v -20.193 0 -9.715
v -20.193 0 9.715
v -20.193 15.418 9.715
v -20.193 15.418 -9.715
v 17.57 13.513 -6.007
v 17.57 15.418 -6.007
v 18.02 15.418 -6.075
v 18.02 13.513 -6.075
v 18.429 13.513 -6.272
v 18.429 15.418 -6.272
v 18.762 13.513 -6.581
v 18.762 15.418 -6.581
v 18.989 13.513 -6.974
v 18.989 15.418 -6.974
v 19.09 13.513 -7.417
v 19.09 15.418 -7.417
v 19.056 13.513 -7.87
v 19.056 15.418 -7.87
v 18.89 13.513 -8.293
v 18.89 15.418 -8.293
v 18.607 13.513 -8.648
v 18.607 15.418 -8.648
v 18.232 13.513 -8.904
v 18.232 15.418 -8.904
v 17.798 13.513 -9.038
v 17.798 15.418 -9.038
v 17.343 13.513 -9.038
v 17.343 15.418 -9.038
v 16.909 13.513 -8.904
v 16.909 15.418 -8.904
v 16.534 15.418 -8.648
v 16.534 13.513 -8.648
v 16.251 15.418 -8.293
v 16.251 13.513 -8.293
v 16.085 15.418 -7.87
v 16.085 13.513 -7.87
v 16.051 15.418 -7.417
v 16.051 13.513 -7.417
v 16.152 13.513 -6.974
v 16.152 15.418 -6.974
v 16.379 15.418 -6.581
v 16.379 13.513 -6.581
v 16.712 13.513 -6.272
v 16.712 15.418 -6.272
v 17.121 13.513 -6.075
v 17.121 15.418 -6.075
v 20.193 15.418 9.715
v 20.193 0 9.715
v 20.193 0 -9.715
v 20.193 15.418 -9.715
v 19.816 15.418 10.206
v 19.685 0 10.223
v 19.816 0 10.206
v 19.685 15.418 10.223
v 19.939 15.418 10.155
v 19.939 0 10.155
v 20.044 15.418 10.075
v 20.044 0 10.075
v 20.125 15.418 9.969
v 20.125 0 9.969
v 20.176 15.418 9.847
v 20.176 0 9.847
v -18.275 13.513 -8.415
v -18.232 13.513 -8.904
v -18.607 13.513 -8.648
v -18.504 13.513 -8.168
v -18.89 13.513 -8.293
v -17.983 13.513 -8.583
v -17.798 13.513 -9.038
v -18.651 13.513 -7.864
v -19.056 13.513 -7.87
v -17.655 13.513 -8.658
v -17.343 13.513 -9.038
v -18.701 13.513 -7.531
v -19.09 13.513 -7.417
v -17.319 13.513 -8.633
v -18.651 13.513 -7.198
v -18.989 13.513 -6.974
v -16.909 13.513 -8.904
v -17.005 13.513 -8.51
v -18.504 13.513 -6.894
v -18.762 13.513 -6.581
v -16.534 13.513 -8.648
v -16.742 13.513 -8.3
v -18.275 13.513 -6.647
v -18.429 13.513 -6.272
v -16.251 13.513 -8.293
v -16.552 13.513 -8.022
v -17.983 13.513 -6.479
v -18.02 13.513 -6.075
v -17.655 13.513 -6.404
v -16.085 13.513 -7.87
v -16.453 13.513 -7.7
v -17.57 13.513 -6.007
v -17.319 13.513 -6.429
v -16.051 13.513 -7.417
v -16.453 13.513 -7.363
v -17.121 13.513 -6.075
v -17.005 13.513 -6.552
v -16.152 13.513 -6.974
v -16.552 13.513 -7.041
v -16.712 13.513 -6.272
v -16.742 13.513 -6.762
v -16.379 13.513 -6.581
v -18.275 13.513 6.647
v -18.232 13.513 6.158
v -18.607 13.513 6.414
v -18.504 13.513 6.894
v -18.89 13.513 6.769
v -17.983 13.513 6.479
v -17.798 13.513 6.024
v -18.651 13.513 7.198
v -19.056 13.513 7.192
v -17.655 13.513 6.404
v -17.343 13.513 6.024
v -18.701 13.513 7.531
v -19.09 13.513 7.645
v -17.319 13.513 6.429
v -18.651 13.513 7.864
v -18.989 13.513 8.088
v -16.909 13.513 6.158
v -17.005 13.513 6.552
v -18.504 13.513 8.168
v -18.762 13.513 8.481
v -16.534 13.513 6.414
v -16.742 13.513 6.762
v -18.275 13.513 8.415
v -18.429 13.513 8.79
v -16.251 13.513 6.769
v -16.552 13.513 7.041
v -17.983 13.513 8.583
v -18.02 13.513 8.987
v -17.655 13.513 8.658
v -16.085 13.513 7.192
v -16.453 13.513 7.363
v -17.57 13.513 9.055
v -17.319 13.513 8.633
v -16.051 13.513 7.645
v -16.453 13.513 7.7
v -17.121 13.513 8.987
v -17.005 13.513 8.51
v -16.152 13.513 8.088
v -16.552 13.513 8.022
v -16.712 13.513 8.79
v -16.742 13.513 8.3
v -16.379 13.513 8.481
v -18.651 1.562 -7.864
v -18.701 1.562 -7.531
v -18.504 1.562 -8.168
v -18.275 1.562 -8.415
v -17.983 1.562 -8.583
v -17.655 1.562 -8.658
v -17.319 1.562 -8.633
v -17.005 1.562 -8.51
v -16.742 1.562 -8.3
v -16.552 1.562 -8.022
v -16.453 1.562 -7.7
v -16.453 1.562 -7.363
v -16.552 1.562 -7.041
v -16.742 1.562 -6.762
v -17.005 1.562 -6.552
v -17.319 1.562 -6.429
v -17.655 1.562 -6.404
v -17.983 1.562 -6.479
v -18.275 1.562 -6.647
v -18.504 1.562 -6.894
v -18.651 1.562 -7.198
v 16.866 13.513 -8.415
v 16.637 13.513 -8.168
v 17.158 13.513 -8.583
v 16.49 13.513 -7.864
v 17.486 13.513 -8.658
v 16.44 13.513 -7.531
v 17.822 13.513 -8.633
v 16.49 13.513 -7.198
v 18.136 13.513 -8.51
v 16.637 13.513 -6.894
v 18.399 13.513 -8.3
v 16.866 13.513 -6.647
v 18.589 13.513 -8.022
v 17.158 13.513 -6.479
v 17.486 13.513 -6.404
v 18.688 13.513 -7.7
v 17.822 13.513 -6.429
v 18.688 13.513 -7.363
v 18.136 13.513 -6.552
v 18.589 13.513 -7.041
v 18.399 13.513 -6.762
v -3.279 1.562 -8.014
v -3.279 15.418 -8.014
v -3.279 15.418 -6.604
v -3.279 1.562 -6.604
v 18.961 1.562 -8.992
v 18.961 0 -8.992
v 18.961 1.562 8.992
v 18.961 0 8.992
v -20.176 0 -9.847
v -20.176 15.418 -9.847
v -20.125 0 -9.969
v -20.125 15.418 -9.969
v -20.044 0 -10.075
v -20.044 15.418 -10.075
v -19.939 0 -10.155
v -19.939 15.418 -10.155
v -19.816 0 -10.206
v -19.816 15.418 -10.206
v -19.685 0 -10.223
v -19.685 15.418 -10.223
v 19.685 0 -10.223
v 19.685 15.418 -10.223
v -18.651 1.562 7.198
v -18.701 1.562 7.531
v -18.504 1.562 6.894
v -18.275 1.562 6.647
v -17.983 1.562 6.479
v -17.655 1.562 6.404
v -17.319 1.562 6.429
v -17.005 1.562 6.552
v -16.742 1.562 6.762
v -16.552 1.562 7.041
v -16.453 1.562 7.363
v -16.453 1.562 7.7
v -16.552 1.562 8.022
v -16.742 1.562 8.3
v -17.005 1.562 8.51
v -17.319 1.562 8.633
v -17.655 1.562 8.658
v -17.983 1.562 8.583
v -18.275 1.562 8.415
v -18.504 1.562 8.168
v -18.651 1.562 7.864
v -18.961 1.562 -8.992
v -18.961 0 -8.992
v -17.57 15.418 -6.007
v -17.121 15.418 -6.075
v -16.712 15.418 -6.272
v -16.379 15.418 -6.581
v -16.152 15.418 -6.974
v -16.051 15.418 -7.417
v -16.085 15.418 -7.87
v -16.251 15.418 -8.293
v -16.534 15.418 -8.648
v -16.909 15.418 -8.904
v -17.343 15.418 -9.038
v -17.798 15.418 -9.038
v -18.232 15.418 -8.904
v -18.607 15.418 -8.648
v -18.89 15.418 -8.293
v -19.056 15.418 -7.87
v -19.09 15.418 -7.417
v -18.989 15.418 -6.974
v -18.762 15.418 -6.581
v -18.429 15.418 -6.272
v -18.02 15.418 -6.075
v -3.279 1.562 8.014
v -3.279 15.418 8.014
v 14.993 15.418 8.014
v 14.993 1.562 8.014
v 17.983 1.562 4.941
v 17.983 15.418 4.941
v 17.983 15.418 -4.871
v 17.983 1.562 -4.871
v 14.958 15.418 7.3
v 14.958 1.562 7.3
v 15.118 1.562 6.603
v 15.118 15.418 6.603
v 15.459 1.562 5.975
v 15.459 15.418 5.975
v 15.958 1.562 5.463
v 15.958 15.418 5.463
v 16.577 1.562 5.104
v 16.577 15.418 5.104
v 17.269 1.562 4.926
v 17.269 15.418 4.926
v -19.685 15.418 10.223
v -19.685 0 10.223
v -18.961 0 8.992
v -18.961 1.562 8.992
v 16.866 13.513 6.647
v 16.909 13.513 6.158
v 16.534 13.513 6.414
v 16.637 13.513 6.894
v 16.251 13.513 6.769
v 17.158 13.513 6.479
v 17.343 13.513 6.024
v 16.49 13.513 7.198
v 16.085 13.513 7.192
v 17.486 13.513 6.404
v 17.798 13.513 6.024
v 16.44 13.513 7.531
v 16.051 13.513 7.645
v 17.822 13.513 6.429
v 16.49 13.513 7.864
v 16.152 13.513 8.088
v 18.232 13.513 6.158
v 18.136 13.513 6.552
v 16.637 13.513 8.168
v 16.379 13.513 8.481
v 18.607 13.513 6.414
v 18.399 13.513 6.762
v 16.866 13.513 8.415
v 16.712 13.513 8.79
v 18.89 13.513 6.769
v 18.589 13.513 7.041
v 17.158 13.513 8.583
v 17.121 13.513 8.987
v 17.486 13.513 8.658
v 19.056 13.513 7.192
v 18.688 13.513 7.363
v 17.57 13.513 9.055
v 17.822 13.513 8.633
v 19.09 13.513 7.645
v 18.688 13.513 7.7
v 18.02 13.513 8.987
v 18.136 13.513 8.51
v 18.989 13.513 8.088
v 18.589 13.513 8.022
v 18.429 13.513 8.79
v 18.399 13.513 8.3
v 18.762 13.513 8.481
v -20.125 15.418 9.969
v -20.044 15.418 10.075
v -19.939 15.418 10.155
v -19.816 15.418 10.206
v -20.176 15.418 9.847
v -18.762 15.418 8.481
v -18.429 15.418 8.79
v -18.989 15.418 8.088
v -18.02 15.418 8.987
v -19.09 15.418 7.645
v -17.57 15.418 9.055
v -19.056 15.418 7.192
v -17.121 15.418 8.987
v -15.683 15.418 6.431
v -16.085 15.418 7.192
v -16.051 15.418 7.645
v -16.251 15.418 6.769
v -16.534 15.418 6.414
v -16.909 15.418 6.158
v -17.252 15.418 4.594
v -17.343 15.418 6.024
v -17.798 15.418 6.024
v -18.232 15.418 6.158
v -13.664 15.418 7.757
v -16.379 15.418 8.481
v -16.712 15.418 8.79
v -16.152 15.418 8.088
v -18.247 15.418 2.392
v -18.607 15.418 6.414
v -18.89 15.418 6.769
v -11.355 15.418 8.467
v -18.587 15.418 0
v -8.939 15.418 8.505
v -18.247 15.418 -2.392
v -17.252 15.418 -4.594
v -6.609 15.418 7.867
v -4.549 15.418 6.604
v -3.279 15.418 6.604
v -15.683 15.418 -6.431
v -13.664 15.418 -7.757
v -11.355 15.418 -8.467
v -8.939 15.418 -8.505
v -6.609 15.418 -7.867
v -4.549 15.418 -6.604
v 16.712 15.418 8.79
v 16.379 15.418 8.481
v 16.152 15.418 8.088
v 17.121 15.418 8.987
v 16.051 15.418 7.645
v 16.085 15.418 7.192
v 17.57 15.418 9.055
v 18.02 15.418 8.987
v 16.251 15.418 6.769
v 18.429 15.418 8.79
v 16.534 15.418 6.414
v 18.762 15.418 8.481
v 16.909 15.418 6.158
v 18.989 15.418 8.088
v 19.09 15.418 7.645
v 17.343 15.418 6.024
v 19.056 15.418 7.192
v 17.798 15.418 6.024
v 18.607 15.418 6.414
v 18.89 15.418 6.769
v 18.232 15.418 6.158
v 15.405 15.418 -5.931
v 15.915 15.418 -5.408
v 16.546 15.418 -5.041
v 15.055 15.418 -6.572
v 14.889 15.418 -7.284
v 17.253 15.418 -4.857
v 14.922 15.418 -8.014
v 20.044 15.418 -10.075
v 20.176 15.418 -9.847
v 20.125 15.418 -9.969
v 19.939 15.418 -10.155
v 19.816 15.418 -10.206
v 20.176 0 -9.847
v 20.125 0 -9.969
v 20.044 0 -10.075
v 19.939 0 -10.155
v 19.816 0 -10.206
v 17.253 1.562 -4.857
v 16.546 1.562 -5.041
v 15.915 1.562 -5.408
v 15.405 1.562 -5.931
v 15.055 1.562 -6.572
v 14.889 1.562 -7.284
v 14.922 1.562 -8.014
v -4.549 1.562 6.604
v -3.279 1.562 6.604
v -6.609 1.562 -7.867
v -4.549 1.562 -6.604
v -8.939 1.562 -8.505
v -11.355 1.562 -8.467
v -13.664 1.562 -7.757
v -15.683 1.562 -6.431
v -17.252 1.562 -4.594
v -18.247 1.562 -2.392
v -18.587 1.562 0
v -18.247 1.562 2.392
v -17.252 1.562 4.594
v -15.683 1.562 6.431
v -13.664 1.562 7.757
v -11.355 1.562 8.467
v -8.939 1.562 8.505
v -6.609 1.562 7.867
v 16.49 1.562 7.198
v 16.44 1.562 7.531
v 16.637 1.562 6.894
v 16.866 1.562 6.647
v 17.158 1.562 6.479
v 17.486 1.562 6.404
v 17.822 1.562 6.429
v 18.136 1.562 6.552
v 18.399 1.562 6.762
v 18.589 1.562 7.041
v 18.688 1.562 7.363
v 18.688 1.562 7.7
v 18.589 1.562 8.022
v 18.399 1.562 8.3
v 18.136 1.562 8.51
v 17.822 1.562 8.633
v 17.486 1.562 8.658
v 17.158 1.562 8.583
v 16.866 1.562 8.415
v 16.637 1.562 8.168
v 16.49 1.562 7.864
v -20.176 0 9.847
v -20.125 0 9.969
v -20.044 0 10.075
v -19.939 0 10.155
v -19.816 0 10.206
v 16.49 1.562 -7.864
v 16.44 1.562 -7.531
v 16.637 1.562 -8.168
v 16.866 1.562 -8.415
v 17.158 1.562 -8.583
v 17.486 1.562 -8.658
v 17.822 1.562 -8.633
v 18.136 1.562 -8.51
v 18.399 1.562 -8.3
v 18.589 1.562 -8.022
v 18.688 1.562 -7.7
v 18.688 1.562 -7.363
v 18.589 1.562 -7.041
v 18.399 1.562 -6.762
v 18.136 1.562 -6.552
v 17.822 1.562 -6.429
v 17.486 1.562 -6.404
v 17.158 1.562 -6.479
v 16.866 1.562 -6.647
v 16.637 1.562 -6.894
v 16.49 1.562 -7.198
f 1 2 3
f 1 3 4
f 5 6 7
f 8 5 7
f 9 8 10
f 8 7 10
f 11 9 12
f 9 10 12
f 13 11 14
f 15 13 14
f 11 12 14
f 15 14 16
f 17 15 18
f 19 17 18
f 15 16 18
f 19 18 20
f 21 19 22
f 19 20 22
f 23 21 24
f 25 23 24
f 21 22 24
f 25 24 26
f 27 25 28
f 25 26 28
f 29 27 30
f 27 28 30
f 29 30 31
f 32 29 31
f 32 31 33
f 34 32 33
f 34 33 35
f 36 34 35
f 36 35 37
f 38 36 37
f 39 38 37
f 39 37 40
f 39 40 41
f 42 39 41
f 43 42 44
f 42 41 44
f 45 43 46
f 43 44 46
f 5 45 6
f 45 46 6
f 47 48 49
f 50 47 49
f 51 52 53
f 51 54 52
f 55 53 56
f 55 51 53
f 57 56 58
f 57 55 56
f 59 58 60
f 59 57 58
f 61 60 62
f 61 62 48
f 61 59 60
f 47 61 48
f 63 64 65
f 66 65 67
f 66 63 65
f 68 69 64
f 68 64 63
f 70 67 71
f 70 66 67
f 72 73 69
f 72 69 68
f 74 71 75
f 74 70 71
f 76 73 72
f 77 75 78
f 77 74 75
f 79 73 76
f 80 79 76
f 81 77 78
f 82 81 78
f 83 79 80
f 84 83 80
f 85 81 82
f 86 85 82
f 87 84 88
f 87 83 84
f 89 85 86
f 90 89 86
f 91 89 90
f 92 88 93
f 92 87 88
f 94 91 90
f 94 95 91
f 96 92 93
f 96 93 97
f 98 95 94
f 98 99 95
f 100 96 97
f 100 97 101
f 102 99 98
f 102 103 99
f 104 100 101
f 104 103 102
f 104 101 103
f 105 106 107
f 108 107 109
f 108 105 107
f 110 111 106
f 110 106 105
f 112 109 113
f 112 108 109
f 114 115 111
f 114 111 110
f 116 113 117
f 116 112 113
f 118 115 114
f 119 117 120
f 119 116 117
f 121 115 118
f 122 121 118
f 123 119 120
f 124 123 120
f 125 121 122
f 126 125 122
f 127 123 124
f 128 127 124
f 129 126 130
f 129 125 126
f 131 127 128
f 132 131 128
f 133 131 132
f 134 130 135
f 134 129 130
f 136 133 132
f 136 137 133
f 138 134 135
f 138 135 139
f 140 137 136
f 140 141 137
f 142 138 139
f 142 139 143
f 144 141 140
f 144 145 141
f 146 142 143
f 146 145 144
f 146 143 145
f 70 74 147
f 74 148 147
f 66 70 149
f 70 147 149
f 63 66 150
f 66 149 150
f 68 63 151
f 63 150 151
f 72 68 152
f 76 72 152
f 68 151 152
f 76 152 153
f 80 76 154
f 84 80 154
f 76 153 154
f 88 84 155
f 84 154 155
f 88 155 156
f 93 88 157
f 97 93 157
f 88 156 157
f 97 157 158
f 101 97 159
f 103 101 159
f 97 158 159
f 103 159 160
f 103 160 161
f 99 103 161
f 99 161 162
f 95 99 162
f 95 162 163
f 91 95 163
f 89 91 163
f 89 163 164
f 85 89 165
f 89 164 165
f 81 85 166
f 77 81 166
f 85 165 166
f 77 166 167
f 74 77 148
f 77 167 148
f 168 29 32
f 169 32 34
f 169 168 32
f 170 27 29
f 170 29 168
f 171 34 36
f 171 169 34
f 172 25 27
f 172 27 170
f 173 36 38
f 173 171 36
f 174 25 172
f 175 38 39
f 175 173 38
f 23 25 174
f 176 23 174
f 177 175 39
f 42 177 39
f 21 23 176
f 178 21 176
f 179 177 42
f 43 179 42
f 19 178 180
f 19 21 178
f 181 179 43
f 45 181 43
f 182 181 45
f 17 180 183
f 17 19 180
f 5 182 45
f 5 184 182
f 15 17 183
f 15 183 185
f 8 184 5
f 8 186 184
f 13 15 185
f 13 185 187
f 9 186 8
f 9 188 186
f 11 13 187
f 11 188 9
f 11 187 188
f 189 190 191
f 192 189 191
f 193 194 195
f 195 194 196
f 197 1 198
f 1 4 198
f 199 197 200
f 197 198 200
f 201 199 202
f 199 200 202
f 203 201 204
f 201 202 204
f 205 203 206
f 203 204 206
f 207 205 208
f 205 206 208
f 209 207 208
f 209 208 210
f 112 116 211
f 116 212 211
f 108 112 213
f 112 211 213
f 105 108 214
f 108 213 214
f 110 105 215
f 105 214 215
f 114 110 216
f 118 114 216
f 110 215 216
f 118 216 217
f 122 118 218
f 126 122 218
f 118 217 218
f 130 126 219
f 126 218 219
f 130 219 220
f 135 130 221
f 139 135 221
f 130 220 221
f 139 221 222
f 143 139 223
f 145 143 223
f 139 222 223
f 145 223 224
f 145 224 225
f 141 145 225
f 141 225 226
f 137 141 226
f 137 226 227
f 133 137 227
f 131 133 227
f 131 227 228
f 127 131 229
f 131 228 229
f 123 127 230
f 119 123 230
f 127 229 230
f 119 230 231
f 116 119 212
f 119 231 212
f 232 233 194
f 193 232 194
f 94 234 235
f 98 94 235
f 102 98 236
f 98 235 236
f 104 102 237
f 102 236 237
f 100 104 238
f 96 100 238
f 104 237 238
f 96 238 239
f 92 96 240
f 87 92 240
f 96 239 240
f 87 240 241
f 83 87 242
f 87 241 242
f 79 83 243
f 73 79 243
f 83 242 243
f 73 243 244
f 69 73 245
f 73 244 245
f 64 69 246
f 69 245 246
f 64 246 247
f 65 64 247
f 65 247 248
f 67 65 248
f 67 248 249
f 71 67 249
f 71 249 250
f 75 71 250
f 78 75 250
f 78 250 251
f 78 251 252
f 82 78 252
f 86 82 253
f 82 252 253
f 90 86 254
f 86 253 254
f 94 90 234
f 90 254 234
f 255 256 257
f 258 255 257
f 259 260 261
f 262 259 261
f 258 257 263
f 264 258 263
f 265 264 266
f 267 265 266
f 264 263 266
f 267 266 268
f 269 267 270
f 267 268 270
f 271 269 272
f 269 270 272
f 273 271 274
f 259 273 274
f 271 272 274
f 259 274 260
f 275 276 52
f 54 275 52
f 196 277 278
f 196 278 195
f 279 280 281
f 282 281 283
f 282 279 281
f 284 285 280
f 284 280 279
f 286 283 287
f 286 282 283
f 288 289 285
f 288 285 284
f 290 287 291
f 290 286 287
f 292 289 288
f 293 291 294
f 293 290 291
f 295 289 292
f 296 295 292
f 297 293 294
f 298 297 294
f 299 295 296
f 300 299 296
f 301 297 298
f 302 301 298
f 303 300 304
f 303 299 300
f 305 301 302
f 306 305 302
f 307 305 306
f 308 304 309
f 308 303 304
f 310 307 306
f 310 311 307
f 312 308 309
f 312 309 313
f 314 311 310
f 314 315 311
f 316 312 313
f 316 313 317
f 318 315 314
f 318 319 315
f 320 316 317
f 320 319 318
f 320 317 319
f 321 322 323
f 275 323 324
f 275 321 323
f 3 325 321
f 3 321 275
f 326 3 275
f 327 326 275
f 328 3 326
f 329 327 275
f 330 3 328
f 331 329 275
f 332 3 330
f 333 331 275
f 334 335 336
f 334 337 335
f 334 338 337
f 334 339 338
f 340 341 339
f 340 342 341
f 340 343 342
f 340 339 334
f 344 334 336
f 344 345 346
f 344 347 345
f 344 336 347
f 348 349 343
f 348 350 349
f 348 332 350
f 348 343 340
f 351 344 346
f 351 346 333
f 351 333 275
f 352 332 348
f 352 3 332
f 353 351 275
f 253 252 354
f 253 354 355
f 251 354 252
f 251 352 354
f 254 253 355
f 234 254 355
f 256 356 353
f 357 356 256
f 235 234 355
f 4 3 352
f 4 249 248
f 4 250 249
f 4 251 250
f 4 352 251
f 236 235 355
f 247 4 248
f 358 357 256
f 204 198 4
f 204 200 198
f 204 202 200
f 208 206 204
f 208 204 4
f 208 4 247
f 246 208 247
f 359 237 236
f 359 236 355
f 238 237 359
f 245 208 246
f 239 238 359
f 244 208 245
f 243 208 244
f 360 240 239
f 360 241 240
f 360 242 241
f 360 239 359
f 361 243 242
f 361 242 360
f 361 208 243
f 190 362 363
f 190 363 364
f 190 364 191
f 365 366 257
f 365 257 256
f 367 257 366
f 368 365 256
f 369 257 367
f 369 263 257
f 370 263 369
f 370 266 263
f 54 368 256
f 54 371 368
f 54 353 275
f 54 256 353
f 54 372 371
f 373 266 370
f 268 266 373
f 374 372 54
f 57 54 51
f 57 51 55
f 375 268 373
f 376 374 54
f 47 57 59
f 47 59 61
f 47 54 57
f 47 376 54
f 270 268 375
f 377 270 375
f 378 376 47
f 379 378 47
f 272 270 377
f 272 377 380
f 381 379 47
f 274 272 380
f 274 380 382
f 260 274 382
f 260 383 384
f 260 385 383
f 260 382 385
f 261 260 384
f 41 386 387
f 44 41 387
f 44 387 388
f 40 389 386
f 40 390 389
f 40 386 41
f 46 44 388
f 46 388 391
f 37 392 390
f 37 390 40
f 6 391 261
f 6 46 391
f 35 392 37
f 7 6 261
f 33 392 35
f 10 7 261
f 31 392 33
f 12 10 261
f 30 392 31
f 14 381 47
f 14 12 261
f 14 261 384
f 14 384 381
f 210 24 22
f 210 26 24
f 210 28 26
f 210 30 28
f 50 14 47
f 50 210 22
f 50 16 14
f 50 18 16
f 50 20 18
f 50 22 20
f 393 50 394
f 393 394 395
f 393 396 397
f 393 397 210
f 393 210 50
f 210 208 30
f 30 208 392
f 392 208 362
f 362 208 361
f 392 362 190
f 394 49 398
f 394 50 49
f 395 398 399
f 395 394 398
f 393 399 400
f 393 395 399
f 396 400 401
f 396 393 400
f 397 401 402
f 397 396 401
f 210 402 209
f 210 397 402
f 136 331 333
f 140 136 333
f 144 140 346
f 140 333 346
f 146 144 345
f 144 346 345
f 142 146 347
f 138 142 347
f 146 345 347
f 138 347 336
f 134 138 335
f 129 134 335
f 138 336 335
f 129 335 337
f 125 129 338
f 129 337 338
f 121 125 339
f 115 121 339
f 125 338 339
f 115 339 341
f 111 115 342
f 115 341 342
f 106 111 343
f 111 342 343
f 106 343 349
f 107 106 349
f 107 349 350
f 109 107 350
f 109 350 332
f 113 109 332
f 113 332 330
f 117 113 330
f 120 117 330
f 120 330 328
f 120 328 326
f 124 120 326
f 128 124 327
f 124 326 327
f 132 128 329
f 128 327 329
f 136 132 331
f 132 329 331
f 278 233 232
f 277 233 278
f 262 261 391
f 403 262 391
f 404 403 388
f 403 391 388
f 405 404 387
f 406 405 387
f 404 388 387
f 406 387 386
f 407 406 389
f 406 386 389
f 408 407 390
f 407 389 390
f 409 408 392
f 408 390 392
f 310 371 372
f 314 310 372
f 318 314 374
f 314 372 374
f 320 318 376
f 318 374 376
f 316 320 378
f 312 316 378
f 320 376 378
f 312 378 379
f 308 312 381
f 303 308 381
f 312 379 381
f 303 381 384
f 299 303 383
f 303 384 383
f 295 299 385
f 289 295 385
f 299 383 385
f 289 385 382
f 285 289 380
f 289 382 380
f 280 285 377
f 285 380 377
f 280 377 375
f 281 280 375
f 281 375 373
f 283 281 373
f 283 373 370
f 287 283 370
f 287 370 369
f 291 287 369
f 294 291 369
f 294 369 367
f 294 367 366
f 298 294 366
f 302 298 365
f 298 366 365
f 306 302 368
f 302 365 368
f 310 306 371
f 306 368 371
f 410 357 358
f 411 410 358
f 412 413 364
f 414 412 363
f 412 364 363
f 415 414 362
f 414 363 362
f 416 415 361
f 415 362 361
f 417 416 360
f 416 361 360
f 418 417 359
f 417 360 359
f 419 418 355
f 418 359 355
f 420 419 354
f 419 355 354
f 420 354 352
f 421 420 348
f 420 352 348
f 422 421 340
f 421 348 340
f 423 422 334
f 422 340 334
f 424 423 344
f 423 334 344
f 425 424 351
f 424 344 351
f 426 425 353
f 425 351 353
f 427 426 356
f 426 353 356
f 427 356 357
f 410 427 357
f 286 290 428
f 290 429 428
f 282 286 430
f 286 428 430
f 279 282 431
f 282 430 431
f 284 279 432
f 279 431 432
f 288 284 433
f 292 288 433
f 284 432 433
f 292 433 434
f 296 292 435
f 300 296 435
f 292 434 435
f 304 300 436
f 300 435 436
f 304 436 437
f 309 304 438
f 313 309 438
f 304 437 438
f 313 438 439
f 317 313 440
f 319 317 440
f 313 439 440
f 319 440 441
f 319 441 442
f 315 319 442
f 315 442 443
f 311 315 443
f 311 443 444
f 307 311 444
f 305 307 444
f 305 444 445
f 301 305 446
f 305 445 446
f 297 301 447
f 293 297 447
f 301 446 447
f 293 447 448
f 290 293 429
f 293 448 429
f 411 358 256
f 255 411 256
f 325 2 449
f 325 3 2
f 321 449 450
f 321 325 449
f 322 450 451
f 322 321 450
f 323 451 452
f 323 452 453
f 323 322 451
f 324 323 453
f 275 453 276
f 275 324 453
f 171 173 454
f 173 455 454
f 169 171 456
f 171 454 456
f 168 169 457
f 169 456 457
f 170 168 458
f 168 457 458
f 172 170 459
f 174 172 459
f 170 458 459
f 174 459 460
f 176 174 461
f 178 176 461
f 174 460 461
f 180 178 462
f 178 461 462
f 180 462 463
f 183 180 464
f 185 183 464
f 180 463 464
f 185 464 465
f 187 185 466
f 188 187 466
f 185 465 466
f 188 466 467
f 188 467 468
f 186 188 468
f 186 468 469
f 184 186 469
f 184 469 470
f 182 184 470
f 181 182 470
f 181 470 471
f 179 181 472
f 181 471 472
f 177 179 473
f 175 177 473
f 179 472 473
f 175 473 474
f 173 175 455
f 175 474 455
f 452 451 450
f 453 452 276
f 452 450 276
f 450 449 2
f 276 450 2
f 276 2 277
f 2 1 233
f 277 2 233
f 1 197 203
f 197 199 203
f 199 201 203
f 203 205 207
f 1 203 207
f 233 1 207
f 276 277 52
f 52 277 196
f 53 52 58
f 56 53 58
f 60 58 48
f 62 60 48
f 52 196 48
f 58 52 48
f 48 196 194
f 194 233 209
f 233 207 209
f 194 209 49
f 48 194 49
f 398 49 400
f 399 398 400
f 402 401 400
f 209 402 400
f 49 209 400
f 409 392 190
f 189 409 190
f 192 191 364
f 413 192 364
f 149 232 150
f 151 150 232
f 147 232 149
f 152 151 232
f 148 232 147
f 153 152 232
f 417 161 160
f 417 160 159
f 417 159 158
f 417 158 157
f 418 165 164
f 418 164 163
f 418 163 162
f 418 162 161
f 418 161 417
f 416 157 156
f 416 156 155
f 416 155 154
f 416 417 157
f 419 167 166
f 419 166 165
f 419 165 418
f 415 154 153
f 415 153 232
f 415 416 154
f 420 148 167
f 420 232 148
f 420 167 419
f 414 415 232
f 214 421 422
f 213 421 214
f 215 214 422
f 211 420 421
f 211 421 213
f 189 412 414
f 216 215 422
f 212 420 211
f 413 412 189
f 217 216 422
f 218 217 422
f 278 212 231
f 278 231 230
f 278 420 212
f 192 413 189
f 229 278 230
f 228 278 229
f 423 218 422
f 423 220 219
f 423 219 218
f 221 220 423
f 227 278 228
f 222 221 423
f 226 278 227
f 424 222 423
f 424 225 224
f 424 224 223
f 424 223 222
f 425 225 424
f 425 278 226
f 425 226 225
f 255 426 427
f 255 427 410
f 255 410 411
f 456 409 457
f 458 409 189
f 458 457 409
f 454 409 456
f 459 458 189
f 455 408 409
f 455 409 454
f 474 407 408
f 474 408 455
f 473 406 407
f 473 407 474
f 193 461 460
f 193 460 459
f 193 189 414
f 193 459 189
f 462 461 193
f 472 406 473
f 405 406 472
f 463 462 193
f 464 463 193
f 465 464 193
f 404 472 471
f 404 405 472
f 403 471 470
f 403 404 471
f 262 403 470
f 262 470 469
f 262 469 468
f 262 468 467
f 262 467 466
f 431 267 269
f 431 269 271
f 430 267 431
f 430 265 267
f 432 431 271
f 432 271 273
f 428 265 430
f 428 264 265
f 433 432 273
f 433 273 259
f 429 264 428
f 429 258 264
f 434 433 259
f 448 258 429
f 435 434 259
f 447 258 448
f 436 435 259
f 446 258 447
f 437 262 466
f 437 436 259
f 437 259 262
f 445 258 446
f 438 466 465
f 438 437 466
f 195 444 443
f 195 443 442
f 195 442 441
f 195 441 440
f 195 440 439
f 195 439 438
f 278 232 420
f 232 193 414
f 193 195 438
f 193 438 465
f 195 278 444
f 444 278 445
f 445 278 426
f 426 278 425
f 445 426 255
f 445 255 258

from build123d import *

# Parameters (mm, degrees)
SKETCH1_W             = 40.386
SKETCH1_H             = 20.447
BOSS_EXTRUDE1_DEPTH   = 15.4178
FILLET1_R             = 0.508
F_2_CLEARANCE_HOLE1_D = 2.2606
SKETCH8_R             = 1.524
CUT_EXTRUDE2_DEPTH    = 1.905
SKETCH6_R             = 8.5725
CUT_EXTRUDE5_DEPTH    = 28.385867854
CUT_EXTRUDE6_DEPTH    = 28.385867854
SKETCH11_W            = 37.9222
SKETCH11_H            = 17.9832
SKETCH11_R            = 1.1303
CUT_EXTRUDE7_DEPTH    = 1.5621


with BuildPart() as part:
    # Sketch1 → Boss-Extrude1 (new body)
    with BuildSketch(Plane(origin=(0, 0, 0), x_dir=(1, 0, 0), z_dir=(0, 1, 0))):
        Rectangle(SKETCH1_W, SKETCH1_H)
    extrude(amount=BOSS_EXTRUDE1_DEPTH)

    # Fillet1
    fillet1_edges = [part.edges().sort_by_distance(p)[0] for p in [
        (20.193, 7.7089, 10.2235),
        (-20.193, 7.7089, 10.2235),
        (-20.193, 7.7089, -10.2235),
        (20.193, 7.7089, -10.2235),
    ]]
    fillet(fillet1_edges, radius=FILLET1_R)

    # #2 Clearance Hole1 (through all)
    with Locations(Plane(origin=(0, 15.4178, 0), x_dir=(1, 0, 0), z_dir=(0, 1, 0))):
        with Locations((17.57045, -7.5311), (-17.57045, 7.5311), (-17.57045, -7.5311), (17.57045, 7.5311)):
            Hole(F_2_CLEARANCE_HOLE1_D / 2)

    # Sketch8 → Cut-Extrude2 (cut)
    with BuildSketch(Plane(origin=(0, 15.4178, 0), x_dir=(1, 0, 0), z_dir=(0, 1, 0))):
        with Locations(Location((-17.57045, -7.5311, 0), (0, 0, 270))):
            Circle(SKETCH8_R)
        with Locations(Location((-17.57045, 7.5311, 0), (0, 0, 270))):
            Circle(SKETCH8_R)
        with Locations(Location((17.57045, 7.5311, 0), (0, 0, 270))):
            Circle(SKETCH8_R)
        with Locations(Location((17.57045, -7.5311, 0), (0, 0, 270))):
            Circle(SKETCH8_R)
    extrude(amount=-CUT_EXTRUDE2_DEPTH, mode=Mode.SUBTRACT)

    # Sketch6 → Cut-Extrude5 (cut, through all)
    with BuildSketch(Plane(origin=(0, 15.4178, 0), x_dir=(1, 0, 0), z_dir=(0, 1, 0))):
        with Locations(Location((-10.014739789, 0, 0), (0, 0, 270))):
            Circle(SKETCH6_R)
    extrude(amount=-CUT_EXTRUDE5_DEPTH, mode=Mode.SUBTRACT)

    # Sketch10 → Cut-Extrude6 (cut, through all)
    with BuildSketch(Plane(origin=(0, 15.4178, 0), x_dir=(1, 0, 0), z_dir=(0, 1, 0))):
        with BuildLine():
            Line((-4.548942478, 6.604), (-4.548942478, -6.604))
            Line((-4.548942478, -6.604), (-3.278942478, -6.604))
            Line((-3.278942478, -6.604), (-3.278942478, -8.0137))
            Line((-3.278942478, -8.0137), (14.99268629, -8.0137))
            ThreePointArc((14.99268629, -8.0137), (15.691232741, -5.701807515), (17.983482839, -4.941279084))
            Line((17.983482839, -4.941279084), (17.983482839, 4.870569671))
            ThreePointArc((17.983482839, 4.870569671), (15.641855904, 5.652392313), (14.921654991, 8.0137))
            Line((14.921654991, 8.0137), (-3.278942478, 8.0137))
            Line((-3.278942478, 8.0137), (-3.278942478, 6.604))
            Line((-3.278942478, 6.604), (-4.548942478, 6.604))
        make_face()
    extrude(amount=-CUT_EXTRUDE6_DEPTH, mode=Mode.SUBTRACT)

    # Sketch11 → Cut-Extrude7 (cut)
    with BuildSketch(Plane.XZ):
        Rectangle(SKETCH11_W, SKETCH11_H)
        with Locations(Location((17.57045, 7.5311, 0), (0, 0, 90))):
            Circle(SKETCH11_R, mode=Mode.SUBTRACT)
        with Locations(Location((-17.57045, 7.5311, 0), (0, 0, 90))):
            Circle(SKETCH11_R, mode=Mode.SUBTRACT)
        with Locations(Location((17.57045, -7.5311, 0), (0, 0, 90))):
            Circle(SKETCH11_R, mode=Mode.SUBTRACT)
        with Locations(Location((-17.57045, -7.5311, 0), (0, 0, 90))):
            Circle(SKETCH11_R, mode=Mode.SUBTRACT)
        with BuildLine():
            Line((14.921654991, -8.0137), (-3.278942478, -8.0137))
            Line((-3.278942478, -8.0137), (-3.278942478, -6.604))
            Line((-3.278942478, -6.604), (-4.548942478, -6.604))
            ThreePointArc((-4.548942478, -6.604), (-18.587239789, 0), (-4.548942478, 6.604))
            Line((-4.548942478, 6.604), (-3.278942478, 6.604))
            Line((-3.278942478, 6.604), (-3.278942478, 8.0137))
            Line((-3.278942478, 8.0137), (14.99268629, 8.0137))
            ThreePointArc((14.99268629, 8.0137), (15.691232741, 5.701807515), (17.983482839, 4.941279084))
            Line((17.983482839, 4.941279084), (17.983482839, -4.870569671))
            ThreePointArc((17.983482839, -4.870569671), (15.641855904, -5.652392313), (14.921654991, -8.0137))
        make_face(mode=Mode.SUBTRACT)
    extrude(amount=-CUT_EXTRUDE7_DEPTH, mode=Mode.SUBTRACT)


solid = part.part
